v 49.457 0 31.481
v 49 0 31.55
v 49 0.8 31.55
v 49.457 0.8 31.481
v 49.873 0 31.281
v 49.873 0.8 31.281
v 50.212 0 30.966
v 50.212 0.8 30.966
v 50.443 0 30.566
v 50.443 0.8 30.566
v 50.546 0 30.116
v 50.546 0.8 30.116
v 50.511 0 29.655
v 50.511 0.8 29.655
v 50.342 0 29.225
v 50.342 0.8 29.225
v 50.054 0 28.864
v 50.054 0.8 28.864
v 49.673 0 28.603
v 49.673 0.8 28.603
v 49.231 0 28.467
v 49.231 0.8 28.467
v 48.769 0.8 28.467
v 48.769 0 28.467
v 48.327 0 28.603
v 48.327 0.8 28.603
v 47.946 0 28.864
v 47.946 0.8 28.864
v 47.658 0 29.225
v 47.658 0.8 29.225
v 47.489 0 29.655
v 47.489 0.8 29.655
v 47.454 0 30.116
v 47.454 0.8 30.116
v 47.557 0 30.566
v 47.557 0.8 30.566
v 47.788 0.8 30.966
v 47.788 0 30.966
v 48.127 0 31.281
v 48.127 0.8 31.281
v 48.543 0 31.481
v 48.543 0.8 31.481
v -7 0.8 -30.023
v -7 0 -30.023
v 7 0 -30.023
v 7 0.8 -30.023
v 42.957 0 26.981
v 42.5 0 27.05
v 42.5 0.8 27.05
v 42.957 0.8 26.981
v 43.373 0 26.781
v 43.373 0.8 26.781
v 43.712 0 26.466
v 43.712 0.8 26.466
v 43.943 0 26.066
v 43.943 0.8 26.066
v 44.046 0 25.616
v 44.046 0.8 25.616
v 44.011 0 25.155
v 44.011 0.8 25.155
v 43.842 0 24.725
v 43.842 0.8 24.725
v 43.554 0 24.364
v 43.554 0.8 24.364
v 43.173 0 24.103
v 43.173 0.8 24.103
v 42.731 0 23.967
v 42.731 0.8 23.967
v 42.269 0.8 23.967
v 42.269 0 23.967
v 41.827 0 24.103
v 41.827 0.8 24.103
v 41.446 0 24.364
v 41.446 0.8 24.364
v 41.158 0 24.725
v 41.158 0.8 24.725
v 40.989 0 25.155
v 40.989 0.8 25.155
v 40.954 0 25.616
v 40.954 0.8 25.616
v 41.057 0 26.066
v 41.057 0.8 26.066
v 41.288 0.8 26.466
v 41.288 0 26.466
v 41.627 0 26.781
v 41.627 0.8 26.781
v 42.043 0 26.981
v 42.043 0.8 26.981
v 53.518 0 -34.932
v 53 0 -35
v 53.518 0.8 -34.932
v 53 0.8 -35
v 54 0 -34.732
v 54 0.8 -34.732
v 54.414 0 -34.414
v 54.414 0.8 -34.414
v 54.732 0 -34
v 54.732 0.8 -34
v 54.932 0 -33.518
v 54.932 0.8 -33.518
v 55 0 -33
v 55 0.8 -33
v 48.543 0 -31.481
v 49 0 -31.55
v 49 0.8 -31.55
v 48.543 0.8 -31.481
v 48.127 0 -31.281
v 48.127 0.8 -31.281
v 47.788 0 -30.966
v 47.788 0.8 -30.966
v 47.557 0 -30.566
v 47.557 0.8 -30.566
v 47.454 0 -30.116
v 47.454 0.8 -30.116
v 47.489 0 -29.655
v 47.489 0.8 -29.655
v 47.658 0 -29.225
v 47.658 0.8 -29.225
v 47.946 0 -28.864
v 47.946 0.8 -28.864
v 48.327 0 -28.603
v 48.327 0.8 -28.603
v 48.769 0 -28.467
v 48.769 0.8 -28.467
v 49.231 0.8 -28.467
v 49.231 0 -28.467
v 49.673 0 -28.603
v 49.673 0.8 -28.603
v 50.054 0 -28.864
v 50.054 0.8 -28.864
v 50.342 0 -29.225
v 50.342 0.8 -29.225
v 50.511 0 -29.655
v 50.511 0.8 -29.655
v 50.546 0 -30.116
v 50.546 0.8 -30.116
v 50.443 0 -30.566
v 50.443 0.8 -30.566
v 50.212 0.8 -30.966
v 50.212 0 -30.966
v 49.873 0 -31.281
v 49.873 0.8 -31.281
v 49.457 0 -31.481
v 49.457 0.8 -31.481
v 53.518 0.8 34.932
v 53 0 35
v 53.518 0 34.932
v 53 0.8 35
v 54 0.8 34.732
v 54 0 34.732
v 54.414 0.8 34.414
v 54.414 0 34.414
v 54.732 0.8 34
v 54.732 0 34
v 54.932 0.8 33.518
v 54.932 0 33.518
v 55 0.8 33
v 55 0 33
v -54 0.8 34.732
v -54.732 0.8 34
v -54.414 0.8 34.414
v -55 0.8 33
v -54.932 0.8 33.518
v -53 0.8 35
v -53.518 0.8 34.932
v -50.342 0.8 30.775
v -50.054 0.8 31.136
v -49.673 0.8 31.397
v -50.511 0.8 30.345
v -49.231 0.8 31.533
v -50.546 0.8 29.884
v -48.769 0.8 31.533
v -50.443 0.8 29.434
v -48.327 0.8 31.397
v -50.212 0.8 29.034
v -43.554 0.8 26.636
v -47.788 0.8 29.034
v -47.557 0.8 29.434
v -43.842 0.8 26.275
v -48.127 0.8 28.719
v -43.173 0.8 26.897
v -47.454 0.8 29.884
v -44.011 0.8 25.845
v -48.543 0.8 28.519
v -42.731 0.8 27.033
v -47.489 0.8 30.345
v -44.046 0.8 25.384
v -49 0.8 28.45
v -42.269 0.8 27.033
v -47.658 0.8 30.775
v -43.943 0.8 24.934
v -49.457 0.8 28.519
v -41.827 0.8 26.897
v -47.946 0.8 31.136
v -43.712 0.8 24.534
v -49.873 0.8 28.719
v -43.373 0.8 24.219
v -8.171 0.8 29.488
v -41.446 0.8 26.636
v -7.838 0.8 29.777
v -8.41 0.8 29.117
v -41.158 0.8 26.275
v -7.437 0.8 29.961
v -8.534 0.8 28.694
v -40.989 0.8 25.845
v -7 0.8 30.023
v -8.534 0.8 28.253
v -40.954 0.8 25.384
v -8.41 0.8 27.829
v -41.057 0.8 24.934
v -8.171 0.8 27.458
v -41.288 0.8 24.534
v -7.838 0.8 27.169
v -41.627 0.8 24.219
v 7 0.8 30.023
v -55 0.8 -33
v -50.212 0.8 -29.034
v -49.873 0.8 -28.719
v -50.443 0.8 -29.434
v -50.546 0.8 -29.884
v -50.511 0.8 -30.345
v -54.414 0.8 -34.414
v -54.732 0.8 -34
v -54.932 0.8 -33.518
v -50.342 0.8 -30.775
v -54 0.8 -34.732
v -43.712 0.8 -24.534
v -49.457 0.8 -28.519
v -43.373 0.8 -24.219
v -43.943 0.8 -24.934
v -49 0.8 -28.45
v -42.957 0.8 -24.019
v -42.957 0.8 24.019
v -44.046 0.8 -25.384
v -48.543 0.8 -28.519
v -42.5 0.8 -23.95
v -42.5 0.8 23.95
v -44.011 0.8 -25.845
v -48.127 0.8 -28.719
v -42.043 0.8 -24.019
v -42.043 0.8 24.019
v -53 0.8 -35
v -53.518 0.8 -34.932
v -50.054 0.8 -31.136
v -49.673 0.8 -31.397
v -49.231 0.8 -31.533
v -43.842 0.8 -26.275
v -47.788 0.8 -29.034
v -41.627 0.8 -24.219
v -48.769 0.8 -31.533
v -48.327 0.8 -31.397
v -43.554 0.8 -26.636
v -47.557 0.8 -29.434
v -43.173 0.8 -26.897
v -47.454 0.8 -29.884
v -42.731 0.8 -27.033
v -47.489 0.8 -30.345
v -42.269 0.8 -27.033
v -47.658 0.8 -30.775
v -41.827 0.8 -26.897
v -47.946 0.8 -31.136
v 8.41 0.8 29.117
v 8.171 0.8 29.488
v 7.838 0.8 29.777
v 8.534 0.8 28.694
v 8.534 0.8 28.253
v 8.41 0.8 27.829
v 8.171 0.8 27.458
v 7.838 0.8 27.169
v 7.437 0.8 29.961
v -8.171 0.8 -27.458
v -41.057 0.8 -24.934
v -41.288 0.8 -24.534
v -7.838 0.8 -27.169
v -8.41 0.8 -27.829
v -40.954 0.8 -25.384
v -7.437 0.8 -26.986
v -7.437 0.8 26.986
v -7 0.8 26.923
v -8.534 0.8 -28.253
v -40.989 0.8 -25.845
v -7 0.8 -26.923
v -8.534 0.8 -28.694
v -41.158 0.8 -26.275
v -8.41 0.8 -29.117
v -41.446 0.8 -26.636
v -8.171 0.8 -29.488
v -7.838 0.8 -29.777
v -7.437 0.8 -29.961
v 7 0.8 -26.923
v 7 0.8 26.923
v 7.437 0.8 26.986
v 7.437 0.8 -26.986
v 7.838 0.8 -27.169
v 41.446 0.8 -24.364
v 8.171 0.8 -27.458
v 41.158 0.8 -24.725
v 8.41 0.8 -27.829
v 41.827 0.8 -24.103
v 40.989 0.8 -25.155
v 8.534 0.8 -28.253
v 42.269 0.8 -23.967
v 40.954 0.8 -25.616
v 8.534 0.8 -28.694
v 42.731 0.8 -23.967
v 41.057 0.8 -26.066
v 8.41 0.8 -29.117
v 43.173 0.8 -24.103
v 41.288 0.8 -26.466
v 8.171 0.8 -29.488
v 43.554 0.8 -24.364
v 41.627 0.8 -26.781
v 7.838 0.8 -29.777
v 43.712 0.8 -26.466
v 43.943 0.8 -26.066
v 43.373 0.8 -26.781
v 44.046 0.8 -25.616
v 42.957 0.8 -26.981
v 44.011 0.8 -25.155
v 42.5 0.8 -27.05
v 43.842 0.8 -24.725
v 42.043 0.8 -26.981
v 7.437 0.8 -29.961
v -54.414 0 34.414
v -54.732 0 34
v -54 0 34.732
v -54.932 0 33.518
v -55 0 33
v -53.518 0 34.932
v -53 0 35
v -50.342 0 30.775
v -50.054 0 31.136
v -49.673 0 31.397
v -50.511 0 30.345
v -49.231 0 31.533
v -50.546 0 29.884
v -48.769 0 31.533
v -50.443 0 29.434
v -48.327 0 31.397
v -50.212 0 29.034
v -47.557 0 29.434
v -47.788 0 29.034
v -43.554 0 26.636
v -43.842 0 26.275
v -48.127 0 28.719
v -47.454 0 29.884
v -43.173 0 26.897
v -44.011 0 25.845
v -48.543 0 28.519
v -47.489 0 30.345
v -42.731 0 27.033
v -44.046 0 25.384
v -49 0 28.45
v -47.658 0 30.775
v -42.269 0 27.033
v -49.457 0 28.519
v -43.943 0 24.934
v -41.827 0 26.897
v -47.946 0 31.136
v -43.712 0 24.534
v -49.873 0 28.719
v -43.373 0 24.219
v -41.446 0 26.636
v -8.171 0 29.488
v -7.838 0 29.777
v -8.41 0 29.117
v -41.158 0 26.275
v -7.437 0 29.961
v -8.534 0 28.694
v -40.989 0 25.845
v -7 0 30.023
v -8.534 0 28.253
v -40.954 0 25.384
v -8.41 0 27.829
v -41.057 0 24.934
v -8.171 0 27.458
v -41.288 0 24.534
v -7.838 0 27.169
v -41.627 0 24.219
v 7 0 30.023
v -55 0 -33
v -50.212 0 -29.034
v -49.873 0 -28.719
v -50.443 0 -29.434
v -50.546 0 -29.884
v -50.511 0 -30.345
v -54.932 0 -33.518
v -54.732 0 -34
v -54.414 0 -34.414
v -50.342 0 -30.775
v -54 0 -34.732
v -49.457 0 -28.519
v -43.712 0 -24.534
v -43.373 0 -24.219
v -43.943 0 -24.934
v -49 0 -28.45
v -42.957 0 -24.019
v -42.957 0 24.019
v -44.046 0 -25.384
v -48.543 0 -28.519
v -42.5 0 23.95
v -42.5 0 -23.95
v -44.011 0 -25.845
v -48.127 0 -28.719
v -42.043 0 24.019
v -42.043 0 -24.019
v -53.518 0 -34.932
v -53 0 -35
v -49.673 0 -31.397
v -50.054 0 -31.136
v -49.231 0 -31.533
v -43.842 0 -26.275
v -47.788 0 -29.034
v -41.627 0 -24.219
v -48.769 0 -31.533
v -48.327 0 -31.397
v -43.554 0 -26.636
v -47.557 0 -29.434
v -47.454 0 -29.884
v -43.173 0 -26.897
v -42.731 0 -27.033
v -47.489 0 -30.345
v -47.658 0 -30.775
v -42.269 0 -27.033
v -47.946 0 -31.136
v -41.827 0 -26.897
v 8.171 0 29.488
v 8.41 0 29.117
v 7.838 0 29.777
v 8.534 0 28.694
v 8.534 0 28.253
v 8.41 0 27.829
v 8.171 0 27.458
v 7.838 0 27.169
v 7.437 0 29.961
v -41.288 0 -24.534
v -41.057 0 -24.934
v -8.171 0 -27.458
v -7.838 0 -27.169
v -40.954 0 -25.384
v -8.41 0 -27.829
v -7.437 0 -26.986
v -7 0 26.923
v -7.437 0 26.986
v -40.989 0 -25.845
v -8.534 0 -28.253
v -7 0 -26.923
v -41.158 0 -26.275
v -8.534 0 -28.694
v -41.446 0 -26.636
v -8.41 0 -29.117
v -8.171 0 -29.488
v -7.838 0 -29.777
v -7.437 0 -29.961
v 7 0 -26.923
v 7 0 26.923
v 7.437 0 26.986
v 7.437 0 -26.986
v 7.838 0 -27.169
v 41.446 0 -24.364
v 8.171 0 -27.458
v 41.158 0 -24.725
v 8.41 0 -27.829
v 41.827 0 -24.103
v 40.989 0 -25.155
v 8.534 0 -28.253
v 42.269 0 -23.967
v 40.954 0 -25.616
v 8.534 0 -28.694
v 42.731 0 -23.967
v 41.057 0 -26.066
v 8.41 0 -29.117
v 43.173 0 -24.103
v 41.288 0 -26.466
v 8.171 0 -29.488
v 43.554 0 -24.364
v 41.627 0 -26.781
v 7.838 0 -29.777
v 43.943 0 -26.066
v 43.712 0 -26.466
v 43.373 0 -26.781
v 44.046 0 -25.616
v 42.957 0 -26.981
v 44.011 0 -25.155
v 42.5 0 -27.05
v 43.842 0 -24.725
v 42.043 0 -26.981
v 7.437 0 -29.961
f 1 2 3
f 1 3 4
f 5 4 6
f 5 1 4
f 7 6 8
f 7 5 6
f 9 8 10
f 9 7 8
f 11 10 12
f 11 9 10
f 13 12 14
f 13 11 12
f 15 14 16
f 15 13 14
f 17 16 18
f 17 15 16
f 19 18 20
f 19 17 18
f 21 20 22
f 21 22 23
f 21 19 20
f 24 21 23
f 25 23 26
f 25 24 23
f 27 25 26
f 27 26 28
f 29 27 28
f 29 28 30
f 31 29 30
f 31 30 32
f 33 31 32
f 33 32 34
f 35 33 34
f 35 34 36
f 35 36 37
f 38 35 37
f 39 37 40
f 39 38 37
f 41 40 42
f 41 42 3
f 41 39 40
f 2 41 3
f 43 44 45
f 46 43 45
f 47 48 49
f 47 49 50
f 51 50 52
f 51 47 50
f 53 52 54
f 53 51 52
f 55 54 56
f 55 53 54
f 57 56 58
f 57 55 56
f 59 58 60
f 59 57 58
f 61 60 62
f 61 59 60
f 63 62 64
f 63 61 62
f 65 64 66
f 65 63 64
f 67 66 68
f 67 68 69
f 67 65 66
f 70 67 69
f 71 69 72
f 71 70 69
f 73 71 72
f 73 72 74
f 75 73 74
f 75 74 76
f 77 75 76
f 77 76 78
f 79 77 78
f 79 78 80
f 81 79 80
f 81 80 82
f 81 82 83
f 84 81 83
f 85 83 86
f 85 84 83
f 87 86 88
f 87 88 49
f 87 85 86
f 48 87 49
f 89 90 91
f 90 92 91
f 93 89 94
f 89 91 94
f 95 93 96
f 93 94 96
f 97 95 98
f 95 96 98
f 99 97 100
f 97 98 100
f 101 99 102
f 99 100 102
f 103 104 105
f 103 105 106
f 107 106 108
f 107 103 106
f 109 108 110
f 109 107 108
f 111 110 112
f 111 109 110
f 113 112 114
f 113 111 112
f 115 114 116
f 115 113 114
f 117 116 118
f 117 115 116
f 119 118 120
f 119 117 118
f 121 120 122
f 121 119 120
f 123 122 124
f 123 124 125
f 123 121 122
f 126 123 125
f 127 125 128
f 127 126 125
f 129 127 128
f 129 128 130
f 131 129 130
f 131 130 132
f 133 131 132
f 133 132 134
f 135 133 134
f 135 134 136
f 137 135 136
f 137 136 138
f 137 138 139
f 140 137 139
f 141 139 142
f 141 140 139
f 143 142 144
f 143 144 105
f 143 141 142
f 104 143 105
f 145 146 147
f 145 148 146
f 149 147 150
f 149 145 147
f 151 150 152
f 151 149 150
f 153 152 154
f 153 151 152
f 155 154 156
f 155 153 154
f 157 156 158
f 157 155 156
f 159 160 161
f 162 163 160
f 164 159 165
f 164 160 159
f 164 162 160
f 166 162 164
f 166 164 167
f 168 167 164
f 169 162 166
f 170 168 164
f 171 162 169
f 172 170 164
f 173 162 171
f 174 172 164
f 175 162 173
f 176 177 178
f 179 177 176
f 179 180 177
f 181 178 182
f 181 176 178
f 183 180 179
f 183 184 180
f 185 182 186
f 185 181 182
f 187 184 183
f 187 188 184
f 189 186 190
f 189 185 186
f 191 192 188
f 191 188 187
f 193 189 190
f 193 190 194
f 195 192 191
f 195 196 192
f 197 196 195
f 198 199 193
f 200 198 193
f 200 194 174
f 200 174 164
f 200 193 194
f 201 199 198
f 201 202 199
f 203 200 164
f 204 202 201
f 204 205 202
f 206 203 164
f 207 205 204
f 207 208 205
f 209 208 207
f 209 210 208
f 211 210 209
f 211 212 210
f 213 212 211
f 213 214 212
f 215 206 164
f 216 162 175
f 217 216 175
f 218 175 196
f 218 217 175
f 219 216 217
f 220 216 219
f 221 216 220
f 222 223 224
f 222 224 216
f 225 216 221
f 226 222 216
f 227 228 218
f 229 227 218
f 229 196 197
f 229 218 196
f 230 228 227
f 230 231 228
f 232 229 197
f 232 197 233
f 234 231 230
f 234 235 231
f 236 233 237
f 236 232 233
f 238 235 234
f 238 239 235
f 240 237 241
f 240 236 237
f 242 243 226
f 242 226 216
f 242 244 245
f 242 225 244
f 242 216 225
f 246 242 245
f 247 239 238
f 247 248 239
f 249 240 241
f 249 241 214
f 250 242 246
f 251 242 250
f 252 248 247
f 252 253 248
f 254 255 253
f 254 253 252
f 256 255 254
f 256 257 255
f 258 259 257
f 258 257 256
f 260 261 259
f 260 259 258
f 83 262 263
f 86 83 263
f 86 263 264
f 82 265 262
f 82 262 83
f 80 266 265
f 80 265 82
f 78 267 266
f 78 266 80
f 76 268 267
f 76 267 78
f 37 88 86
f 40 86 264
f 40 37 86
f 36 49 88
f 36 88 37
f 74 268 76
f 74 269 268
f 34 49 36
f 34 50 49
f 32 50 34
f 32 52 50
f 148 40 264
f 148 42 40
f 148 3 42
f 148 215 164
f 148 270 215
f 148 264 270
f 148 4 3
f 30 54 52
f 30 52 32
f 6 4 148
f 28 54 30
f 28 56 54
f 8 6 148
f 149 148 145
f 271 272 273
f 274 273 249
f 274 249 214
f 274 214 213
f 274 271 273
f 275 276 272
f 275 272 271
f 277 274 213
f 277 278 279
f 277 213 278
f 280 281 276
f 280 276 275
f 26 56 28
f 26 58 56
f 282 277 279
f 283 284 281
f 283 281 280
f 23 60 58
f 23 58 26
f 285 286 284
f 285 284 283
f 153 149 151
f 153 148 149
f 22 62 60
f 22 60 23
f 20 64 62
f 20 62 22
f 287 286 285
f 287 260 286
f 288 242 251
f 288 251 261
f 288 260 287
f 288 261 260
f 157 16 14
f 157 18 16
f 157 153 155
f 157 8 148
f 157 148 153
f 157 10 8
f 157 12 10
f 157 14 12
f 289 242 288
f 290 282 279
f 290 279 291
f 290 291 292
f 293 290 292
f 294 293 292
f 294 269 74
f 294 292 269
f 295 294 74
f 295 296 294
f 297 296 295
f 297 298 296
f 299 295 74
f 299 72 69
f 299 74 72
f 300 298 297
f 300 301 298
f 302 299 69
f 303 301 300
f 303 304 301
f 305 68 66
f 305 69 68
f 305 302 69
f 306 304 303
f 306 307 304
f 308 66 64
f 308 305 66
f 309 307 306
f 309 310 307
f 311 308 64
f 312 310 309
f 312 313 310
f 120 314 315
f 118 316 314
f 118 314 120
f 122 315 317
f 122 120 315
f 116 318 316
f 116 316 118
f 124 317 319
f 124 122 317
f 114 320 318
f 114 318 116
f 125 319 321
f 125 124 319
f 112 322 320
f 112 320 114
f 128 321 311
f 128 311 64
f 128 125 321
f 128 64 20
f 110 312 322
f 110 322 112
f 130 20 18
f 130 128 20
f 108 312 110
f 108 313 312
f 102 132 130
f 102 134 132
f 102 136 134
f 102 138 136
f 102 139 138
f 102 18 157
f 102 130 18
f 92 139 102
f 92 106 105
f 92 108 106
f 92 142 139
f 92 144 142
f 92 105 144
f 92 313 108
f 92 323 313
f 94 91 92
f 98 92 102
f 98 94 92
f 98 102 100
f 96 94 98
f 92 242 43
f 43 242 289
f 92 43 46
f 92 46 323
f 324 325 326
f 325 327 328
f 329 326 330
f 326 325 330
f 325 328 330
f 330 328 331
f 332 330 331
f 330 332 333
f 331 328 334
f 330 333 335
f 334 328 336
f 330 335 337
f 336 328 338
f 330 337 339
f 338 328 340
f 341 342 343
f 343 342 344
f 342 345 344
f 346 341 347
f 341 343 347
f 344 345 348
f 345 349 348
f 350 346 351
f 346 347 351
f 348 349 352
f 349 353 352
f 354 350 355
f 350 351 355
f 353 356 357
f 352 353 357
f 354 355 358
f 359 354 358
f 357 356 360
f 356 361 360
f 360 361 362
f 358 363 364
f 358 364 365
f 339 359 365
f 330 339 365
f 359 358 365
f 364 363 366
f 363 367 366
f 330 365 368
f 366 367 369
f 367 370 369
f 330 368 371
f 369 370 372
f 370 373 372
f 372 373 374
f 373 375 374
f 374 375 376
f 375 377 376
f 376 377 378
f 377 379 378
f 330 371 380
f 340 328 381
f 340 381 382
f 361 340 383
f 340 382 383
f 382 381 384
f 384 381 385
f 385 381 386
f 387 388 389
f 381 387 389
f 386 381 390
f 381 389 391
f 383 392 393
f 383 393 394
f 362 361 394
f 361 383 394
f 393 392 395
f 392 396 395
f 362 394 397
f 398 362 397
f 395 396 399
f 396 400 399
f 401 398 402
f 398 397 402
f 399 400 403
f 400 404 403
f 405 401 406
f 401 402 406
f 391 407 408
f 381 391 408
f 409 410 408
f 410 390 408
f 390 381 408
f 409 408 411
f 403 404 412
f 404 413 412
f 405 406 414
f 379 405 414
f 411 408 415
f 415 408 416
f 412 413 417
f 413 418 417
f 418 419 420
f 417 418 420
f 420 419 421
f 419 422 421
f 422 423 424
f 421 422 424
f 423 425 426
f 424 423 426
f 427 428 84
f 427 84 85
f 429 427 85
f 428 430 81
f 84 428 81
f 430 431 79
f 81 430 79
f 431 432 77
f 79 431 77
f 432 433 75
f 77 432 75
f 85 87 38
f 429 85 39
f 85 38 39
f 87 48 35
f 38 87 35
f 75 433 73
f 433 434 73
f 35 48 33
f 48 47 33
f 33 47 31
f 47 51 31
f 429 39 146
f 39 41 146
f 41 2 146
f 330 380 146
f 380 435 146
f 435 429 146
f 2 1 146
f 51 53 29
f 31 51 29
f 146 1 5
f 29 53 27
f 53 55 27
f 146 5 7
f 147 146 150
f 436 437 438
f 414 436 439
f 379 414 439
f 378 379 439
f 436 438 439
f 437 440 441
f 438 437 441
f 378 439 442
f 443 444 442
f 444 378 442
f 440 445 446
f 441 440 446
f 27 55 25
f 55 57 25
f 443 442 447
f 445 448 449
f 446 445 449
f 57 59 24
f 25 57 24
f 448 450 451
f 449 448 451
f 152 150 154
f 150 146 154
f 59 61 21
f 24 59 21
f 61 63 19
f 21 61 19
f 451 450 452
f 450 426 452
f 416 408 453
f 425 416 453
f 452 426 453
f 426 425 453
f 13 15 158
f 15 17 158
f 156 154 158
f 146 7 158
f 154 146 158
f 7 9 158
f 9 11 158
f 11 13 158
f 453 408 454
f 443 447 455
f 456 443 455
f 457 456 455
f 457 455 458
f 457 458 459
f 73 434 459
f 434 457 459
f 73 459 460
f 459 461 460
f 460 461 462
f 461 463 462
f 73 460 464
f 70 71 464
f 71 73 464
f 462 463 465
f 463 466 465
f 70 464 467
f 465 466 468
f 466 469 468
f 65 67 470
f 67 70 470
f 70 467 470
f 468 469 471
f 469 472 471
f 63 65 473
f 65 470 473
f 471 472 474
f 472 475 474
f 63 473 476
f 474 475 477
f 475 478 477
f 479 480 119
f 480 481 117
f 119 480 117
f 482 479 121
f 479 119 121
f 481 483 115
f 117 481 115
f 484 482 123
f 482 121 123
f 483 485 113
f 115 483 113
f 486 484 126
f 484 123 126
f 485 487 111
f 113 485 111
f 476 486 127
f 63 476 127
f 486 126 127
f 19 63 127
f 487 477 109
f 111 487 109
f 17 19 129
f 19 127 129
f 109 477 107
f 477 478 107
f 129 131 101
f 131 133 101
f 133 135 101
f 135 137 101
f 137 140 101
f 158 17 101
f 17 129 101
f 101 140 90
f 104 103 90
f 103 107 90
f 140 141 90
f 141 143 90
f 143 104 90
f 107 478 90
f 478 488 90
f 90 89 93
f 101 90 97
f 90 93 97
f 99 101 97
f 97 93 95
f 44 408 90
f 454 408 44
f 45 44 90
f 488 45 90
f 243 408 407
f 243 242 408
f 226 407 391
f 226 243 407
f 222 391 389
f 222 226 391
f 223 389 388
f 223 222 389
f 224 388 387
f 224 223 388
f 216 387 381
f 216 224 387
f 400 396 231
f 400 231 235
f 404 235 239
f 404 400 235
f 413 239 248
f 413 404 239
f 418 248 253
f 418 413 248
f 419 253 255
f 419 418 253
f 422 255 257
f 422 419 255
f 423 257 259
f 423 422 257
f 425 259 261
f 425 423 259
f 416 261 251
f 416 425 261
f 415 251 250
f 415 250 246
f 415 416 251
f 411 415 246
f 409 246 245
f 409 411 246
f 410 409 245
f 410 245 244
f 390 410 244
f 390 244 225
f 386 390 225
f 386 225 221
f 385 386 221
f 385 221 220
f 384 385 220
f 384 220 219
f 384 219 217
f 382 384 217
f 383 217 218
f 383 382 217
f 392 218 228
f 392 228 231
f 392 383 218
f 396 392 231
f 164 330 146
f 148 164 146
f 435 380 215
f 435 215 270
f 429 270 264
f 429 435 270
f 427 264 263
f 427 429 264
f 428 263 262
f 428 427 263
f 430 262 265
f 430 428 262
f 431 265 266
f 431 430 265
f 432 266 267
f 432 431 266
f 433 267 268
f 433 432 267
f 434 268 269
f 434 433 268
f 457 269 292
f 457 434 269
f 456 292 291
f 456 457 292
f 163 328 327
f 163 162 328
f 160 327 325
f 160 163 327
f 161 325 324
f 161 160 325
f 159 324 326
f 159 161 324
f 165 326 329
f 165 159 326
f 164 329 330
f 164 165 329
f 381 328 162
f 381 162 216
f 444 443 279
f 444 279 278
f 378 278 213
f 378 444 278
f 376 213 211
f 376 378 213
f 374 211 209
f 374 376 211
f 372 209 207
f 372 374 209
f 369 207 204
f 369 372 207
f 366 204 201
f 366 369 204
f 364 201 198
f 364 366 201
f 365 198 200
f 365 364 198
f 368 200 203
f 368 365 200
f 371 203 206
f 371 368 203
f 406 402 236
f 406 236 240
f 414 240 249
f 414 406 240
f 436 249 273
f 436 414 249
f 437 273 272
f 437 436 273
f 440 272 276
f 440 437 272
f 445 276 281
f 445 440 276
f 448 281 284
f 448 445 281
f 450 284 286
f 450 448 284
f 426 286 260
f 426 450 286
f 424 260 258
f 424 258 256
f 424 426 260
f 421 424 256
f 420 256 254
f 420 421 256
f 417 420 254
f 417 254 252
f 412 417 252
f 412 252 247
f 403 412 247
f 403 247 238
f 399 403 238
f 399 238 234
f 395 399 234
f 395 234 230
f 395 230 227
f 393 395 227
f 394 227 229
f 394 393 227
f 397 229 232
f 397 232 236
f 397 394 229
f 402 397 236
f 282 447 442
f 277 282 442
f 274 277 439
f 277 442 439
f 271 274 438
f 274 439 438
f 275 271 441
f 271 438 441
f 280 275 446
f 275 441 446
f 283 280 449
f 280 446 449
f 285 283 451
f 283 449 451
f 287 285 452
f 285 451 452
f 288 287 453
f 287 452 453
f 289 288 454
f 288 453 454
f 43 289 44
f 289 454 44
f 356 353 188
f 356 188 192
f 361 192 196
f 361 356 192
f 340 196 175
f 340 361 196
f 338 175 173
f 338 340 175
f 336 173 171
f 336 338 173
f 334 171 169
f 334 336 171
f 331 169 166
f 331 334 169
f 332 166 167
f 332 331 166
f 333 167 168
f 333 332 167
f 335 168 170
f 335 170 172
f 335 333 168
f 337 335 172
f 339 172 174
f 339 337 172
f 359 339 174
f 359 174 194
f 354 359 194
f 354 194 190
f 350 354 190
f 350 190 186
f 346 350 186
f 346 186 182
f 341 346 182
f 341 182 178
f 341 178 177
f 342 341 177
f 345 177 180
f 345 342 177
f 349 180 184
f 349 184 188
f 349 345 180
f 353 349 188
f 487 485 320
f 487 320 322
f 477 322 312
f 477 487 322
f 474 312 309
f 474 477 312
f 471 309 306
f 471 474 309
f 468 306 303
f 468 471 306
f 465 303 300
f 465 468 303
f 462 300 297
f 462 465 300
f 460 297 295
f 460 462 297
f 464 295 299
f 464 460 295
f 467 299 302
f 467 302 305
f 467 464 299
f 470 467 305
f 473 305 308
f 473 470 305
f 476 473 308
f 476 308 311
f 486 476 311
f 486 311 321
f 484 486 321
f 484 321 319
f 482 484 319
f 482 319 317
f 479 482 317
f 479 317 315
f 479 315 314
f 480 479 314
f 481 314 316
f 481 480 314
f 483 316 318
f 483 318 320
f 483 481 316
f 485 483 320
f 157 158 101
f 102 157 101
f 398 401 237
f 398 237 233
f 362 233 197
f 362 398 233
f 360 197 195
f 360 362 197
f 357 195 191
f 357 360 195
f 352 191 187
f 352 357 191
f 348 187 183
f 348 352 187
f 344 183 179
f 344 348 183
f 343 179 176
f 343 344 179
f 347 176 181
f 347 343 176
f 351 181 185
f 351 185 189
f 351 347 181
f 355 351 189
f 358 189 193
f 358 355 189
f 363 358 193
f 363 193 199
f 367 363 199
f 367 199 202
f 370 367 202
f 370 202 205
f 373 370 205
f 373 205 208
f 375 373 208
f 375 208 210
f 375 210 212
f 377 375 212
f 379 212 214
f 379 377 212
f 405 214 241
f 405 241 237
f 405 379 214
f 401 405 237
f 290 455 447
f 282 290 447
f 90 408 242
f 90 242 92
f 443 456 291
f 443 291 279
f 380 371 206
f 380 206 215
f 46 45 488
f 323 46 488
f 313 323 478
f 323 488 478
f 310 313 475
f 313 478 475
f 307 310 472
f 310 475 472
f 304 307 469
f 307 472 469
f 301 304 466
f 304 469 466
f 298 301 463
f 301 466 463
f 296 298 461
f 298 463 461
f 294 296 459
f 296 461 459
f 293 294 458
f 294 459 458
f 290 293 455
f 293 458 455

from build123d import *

# Parameters (mm, degrees)
SKETCH_1_W      = 110
SKETCH_1_H      = 70
SKETCH_1_R      = 1.55
EXTRUDE_1_DEPTH = 0.8
FILLET_1_R      = 2
FILLET_2_R      = 2
FILLET_3_R      = 2
FILLET_4_R      = 2


with BuildPart() as part:
    # 草图1 → 凸台-拉伸1 (new body)
    with BuildSketch(Plane(origin=(0, 0, 0), x_dir=(1, 0, 0), z_dir=(0, 1, 0))):
        Rectangle(SKETCH_1_W, SKETCH_1_H)
        with Locations(Location((-49, 30, 0), (0, 0, 270))):
            Circle(SKETCH_1_R, mode=Mode.SUBTRACT)
        with Locations(Location((49, 30, 0), (0, 0, 90))):
            Circle(SKETCH_1_R, mode=Mode.SUBTRACT)
        with Locations(Location((49, -30, 0), (0, 0, 270))):
            Circle(SKETCH_1_R, mode=Mode.SUBTRACT)
        with Locations(Location((-49, -30, 0), (0, 0, 90))):
            Circle(SKETCH_1_R, mode=Mode.SUBTRACT)
        with Locations(Location((-42.5, 25.5, 0), (0, 0, 270))):
            Circle(SKETCH_1_R, mode=Mode.SUBTRACT)
        with Locations(Location((42.5, 25.5, 0), (0, 0, 90))):
            Circle(SKETCH_1_R, mode=Mode.SUBTRACT)
        with Locations(Location((42.5, -25.5, 0), (0, 0, 270))):
            Circle(SKETCH_1_R, mode=Mode.SUBTRACT)
        with Locations(Location((-42.5, -25.5, 0), (0, 0, 90))):
            Circle(SKETCH_1_R, mode=Mode.SUBTRACT)
        with BuildLine():
            Line((-7, 30.023350274), (7, 30.023350274))
            ThreePointArc((7, 30.023350274), (8.55, 28.473350274), (7, 26.923350274))
            Line((7, 26.923350274), (-7, 26.923350274))
            ThreePointArc((-7, 26.923350274), (-8.55, 28.473350274), (-7, 30.023350274))
        make_face(mode=Mode.SUBTRACT)
        with BuildLine():
            Line((7, -26.923350274), (-7, -26.923350274))
            ThreePointArc((-7, -26.923350274), (-8.55, -28.473350274), (-7, -30.023350274))
            Line((-7, -30.023350274), (7, -30.023350274))
            ThreePointArc((7, -30.023350274), (8.55, -28.473350274), (7, -26.923350274))
        make_face(mode=Mode.SUBTRACT)
    extrude(amount=EXTRUDE_1_DEPTH)

    # 圆角1
    fillet_1_edges = [part.edges().sort_by_distance(p)[0] for p in [
        (55, 0.4, -35),
    ]]
    fillet(fillet_1_edges, radius=FILLET_1_R)

    # 圆角2
    fillet_2_edges = [part.edges().sort_by_distance(p)[0] for p in [
        (-55, 0.4, -35),
    ]]
    fillet(fillet_2_edges, radius=FILLET_2_R)

    # 圆角3
    fillet_3_edges = [part.edges().sort_by_distance(p)[0] for p in [
        (-55, 0.4, 35),
    ]]
    fillet(fillet_3_edges, radius=FILLET_3_R)

    # 圆角4
    fillet_4_edges = [part.edges().sort_by_distance(p)[0] for p in [
        (55, 0.4, 35),
    ]]
    fillet(fillet_4_edges, radius=FILLET_4_R)


solid = part.part
